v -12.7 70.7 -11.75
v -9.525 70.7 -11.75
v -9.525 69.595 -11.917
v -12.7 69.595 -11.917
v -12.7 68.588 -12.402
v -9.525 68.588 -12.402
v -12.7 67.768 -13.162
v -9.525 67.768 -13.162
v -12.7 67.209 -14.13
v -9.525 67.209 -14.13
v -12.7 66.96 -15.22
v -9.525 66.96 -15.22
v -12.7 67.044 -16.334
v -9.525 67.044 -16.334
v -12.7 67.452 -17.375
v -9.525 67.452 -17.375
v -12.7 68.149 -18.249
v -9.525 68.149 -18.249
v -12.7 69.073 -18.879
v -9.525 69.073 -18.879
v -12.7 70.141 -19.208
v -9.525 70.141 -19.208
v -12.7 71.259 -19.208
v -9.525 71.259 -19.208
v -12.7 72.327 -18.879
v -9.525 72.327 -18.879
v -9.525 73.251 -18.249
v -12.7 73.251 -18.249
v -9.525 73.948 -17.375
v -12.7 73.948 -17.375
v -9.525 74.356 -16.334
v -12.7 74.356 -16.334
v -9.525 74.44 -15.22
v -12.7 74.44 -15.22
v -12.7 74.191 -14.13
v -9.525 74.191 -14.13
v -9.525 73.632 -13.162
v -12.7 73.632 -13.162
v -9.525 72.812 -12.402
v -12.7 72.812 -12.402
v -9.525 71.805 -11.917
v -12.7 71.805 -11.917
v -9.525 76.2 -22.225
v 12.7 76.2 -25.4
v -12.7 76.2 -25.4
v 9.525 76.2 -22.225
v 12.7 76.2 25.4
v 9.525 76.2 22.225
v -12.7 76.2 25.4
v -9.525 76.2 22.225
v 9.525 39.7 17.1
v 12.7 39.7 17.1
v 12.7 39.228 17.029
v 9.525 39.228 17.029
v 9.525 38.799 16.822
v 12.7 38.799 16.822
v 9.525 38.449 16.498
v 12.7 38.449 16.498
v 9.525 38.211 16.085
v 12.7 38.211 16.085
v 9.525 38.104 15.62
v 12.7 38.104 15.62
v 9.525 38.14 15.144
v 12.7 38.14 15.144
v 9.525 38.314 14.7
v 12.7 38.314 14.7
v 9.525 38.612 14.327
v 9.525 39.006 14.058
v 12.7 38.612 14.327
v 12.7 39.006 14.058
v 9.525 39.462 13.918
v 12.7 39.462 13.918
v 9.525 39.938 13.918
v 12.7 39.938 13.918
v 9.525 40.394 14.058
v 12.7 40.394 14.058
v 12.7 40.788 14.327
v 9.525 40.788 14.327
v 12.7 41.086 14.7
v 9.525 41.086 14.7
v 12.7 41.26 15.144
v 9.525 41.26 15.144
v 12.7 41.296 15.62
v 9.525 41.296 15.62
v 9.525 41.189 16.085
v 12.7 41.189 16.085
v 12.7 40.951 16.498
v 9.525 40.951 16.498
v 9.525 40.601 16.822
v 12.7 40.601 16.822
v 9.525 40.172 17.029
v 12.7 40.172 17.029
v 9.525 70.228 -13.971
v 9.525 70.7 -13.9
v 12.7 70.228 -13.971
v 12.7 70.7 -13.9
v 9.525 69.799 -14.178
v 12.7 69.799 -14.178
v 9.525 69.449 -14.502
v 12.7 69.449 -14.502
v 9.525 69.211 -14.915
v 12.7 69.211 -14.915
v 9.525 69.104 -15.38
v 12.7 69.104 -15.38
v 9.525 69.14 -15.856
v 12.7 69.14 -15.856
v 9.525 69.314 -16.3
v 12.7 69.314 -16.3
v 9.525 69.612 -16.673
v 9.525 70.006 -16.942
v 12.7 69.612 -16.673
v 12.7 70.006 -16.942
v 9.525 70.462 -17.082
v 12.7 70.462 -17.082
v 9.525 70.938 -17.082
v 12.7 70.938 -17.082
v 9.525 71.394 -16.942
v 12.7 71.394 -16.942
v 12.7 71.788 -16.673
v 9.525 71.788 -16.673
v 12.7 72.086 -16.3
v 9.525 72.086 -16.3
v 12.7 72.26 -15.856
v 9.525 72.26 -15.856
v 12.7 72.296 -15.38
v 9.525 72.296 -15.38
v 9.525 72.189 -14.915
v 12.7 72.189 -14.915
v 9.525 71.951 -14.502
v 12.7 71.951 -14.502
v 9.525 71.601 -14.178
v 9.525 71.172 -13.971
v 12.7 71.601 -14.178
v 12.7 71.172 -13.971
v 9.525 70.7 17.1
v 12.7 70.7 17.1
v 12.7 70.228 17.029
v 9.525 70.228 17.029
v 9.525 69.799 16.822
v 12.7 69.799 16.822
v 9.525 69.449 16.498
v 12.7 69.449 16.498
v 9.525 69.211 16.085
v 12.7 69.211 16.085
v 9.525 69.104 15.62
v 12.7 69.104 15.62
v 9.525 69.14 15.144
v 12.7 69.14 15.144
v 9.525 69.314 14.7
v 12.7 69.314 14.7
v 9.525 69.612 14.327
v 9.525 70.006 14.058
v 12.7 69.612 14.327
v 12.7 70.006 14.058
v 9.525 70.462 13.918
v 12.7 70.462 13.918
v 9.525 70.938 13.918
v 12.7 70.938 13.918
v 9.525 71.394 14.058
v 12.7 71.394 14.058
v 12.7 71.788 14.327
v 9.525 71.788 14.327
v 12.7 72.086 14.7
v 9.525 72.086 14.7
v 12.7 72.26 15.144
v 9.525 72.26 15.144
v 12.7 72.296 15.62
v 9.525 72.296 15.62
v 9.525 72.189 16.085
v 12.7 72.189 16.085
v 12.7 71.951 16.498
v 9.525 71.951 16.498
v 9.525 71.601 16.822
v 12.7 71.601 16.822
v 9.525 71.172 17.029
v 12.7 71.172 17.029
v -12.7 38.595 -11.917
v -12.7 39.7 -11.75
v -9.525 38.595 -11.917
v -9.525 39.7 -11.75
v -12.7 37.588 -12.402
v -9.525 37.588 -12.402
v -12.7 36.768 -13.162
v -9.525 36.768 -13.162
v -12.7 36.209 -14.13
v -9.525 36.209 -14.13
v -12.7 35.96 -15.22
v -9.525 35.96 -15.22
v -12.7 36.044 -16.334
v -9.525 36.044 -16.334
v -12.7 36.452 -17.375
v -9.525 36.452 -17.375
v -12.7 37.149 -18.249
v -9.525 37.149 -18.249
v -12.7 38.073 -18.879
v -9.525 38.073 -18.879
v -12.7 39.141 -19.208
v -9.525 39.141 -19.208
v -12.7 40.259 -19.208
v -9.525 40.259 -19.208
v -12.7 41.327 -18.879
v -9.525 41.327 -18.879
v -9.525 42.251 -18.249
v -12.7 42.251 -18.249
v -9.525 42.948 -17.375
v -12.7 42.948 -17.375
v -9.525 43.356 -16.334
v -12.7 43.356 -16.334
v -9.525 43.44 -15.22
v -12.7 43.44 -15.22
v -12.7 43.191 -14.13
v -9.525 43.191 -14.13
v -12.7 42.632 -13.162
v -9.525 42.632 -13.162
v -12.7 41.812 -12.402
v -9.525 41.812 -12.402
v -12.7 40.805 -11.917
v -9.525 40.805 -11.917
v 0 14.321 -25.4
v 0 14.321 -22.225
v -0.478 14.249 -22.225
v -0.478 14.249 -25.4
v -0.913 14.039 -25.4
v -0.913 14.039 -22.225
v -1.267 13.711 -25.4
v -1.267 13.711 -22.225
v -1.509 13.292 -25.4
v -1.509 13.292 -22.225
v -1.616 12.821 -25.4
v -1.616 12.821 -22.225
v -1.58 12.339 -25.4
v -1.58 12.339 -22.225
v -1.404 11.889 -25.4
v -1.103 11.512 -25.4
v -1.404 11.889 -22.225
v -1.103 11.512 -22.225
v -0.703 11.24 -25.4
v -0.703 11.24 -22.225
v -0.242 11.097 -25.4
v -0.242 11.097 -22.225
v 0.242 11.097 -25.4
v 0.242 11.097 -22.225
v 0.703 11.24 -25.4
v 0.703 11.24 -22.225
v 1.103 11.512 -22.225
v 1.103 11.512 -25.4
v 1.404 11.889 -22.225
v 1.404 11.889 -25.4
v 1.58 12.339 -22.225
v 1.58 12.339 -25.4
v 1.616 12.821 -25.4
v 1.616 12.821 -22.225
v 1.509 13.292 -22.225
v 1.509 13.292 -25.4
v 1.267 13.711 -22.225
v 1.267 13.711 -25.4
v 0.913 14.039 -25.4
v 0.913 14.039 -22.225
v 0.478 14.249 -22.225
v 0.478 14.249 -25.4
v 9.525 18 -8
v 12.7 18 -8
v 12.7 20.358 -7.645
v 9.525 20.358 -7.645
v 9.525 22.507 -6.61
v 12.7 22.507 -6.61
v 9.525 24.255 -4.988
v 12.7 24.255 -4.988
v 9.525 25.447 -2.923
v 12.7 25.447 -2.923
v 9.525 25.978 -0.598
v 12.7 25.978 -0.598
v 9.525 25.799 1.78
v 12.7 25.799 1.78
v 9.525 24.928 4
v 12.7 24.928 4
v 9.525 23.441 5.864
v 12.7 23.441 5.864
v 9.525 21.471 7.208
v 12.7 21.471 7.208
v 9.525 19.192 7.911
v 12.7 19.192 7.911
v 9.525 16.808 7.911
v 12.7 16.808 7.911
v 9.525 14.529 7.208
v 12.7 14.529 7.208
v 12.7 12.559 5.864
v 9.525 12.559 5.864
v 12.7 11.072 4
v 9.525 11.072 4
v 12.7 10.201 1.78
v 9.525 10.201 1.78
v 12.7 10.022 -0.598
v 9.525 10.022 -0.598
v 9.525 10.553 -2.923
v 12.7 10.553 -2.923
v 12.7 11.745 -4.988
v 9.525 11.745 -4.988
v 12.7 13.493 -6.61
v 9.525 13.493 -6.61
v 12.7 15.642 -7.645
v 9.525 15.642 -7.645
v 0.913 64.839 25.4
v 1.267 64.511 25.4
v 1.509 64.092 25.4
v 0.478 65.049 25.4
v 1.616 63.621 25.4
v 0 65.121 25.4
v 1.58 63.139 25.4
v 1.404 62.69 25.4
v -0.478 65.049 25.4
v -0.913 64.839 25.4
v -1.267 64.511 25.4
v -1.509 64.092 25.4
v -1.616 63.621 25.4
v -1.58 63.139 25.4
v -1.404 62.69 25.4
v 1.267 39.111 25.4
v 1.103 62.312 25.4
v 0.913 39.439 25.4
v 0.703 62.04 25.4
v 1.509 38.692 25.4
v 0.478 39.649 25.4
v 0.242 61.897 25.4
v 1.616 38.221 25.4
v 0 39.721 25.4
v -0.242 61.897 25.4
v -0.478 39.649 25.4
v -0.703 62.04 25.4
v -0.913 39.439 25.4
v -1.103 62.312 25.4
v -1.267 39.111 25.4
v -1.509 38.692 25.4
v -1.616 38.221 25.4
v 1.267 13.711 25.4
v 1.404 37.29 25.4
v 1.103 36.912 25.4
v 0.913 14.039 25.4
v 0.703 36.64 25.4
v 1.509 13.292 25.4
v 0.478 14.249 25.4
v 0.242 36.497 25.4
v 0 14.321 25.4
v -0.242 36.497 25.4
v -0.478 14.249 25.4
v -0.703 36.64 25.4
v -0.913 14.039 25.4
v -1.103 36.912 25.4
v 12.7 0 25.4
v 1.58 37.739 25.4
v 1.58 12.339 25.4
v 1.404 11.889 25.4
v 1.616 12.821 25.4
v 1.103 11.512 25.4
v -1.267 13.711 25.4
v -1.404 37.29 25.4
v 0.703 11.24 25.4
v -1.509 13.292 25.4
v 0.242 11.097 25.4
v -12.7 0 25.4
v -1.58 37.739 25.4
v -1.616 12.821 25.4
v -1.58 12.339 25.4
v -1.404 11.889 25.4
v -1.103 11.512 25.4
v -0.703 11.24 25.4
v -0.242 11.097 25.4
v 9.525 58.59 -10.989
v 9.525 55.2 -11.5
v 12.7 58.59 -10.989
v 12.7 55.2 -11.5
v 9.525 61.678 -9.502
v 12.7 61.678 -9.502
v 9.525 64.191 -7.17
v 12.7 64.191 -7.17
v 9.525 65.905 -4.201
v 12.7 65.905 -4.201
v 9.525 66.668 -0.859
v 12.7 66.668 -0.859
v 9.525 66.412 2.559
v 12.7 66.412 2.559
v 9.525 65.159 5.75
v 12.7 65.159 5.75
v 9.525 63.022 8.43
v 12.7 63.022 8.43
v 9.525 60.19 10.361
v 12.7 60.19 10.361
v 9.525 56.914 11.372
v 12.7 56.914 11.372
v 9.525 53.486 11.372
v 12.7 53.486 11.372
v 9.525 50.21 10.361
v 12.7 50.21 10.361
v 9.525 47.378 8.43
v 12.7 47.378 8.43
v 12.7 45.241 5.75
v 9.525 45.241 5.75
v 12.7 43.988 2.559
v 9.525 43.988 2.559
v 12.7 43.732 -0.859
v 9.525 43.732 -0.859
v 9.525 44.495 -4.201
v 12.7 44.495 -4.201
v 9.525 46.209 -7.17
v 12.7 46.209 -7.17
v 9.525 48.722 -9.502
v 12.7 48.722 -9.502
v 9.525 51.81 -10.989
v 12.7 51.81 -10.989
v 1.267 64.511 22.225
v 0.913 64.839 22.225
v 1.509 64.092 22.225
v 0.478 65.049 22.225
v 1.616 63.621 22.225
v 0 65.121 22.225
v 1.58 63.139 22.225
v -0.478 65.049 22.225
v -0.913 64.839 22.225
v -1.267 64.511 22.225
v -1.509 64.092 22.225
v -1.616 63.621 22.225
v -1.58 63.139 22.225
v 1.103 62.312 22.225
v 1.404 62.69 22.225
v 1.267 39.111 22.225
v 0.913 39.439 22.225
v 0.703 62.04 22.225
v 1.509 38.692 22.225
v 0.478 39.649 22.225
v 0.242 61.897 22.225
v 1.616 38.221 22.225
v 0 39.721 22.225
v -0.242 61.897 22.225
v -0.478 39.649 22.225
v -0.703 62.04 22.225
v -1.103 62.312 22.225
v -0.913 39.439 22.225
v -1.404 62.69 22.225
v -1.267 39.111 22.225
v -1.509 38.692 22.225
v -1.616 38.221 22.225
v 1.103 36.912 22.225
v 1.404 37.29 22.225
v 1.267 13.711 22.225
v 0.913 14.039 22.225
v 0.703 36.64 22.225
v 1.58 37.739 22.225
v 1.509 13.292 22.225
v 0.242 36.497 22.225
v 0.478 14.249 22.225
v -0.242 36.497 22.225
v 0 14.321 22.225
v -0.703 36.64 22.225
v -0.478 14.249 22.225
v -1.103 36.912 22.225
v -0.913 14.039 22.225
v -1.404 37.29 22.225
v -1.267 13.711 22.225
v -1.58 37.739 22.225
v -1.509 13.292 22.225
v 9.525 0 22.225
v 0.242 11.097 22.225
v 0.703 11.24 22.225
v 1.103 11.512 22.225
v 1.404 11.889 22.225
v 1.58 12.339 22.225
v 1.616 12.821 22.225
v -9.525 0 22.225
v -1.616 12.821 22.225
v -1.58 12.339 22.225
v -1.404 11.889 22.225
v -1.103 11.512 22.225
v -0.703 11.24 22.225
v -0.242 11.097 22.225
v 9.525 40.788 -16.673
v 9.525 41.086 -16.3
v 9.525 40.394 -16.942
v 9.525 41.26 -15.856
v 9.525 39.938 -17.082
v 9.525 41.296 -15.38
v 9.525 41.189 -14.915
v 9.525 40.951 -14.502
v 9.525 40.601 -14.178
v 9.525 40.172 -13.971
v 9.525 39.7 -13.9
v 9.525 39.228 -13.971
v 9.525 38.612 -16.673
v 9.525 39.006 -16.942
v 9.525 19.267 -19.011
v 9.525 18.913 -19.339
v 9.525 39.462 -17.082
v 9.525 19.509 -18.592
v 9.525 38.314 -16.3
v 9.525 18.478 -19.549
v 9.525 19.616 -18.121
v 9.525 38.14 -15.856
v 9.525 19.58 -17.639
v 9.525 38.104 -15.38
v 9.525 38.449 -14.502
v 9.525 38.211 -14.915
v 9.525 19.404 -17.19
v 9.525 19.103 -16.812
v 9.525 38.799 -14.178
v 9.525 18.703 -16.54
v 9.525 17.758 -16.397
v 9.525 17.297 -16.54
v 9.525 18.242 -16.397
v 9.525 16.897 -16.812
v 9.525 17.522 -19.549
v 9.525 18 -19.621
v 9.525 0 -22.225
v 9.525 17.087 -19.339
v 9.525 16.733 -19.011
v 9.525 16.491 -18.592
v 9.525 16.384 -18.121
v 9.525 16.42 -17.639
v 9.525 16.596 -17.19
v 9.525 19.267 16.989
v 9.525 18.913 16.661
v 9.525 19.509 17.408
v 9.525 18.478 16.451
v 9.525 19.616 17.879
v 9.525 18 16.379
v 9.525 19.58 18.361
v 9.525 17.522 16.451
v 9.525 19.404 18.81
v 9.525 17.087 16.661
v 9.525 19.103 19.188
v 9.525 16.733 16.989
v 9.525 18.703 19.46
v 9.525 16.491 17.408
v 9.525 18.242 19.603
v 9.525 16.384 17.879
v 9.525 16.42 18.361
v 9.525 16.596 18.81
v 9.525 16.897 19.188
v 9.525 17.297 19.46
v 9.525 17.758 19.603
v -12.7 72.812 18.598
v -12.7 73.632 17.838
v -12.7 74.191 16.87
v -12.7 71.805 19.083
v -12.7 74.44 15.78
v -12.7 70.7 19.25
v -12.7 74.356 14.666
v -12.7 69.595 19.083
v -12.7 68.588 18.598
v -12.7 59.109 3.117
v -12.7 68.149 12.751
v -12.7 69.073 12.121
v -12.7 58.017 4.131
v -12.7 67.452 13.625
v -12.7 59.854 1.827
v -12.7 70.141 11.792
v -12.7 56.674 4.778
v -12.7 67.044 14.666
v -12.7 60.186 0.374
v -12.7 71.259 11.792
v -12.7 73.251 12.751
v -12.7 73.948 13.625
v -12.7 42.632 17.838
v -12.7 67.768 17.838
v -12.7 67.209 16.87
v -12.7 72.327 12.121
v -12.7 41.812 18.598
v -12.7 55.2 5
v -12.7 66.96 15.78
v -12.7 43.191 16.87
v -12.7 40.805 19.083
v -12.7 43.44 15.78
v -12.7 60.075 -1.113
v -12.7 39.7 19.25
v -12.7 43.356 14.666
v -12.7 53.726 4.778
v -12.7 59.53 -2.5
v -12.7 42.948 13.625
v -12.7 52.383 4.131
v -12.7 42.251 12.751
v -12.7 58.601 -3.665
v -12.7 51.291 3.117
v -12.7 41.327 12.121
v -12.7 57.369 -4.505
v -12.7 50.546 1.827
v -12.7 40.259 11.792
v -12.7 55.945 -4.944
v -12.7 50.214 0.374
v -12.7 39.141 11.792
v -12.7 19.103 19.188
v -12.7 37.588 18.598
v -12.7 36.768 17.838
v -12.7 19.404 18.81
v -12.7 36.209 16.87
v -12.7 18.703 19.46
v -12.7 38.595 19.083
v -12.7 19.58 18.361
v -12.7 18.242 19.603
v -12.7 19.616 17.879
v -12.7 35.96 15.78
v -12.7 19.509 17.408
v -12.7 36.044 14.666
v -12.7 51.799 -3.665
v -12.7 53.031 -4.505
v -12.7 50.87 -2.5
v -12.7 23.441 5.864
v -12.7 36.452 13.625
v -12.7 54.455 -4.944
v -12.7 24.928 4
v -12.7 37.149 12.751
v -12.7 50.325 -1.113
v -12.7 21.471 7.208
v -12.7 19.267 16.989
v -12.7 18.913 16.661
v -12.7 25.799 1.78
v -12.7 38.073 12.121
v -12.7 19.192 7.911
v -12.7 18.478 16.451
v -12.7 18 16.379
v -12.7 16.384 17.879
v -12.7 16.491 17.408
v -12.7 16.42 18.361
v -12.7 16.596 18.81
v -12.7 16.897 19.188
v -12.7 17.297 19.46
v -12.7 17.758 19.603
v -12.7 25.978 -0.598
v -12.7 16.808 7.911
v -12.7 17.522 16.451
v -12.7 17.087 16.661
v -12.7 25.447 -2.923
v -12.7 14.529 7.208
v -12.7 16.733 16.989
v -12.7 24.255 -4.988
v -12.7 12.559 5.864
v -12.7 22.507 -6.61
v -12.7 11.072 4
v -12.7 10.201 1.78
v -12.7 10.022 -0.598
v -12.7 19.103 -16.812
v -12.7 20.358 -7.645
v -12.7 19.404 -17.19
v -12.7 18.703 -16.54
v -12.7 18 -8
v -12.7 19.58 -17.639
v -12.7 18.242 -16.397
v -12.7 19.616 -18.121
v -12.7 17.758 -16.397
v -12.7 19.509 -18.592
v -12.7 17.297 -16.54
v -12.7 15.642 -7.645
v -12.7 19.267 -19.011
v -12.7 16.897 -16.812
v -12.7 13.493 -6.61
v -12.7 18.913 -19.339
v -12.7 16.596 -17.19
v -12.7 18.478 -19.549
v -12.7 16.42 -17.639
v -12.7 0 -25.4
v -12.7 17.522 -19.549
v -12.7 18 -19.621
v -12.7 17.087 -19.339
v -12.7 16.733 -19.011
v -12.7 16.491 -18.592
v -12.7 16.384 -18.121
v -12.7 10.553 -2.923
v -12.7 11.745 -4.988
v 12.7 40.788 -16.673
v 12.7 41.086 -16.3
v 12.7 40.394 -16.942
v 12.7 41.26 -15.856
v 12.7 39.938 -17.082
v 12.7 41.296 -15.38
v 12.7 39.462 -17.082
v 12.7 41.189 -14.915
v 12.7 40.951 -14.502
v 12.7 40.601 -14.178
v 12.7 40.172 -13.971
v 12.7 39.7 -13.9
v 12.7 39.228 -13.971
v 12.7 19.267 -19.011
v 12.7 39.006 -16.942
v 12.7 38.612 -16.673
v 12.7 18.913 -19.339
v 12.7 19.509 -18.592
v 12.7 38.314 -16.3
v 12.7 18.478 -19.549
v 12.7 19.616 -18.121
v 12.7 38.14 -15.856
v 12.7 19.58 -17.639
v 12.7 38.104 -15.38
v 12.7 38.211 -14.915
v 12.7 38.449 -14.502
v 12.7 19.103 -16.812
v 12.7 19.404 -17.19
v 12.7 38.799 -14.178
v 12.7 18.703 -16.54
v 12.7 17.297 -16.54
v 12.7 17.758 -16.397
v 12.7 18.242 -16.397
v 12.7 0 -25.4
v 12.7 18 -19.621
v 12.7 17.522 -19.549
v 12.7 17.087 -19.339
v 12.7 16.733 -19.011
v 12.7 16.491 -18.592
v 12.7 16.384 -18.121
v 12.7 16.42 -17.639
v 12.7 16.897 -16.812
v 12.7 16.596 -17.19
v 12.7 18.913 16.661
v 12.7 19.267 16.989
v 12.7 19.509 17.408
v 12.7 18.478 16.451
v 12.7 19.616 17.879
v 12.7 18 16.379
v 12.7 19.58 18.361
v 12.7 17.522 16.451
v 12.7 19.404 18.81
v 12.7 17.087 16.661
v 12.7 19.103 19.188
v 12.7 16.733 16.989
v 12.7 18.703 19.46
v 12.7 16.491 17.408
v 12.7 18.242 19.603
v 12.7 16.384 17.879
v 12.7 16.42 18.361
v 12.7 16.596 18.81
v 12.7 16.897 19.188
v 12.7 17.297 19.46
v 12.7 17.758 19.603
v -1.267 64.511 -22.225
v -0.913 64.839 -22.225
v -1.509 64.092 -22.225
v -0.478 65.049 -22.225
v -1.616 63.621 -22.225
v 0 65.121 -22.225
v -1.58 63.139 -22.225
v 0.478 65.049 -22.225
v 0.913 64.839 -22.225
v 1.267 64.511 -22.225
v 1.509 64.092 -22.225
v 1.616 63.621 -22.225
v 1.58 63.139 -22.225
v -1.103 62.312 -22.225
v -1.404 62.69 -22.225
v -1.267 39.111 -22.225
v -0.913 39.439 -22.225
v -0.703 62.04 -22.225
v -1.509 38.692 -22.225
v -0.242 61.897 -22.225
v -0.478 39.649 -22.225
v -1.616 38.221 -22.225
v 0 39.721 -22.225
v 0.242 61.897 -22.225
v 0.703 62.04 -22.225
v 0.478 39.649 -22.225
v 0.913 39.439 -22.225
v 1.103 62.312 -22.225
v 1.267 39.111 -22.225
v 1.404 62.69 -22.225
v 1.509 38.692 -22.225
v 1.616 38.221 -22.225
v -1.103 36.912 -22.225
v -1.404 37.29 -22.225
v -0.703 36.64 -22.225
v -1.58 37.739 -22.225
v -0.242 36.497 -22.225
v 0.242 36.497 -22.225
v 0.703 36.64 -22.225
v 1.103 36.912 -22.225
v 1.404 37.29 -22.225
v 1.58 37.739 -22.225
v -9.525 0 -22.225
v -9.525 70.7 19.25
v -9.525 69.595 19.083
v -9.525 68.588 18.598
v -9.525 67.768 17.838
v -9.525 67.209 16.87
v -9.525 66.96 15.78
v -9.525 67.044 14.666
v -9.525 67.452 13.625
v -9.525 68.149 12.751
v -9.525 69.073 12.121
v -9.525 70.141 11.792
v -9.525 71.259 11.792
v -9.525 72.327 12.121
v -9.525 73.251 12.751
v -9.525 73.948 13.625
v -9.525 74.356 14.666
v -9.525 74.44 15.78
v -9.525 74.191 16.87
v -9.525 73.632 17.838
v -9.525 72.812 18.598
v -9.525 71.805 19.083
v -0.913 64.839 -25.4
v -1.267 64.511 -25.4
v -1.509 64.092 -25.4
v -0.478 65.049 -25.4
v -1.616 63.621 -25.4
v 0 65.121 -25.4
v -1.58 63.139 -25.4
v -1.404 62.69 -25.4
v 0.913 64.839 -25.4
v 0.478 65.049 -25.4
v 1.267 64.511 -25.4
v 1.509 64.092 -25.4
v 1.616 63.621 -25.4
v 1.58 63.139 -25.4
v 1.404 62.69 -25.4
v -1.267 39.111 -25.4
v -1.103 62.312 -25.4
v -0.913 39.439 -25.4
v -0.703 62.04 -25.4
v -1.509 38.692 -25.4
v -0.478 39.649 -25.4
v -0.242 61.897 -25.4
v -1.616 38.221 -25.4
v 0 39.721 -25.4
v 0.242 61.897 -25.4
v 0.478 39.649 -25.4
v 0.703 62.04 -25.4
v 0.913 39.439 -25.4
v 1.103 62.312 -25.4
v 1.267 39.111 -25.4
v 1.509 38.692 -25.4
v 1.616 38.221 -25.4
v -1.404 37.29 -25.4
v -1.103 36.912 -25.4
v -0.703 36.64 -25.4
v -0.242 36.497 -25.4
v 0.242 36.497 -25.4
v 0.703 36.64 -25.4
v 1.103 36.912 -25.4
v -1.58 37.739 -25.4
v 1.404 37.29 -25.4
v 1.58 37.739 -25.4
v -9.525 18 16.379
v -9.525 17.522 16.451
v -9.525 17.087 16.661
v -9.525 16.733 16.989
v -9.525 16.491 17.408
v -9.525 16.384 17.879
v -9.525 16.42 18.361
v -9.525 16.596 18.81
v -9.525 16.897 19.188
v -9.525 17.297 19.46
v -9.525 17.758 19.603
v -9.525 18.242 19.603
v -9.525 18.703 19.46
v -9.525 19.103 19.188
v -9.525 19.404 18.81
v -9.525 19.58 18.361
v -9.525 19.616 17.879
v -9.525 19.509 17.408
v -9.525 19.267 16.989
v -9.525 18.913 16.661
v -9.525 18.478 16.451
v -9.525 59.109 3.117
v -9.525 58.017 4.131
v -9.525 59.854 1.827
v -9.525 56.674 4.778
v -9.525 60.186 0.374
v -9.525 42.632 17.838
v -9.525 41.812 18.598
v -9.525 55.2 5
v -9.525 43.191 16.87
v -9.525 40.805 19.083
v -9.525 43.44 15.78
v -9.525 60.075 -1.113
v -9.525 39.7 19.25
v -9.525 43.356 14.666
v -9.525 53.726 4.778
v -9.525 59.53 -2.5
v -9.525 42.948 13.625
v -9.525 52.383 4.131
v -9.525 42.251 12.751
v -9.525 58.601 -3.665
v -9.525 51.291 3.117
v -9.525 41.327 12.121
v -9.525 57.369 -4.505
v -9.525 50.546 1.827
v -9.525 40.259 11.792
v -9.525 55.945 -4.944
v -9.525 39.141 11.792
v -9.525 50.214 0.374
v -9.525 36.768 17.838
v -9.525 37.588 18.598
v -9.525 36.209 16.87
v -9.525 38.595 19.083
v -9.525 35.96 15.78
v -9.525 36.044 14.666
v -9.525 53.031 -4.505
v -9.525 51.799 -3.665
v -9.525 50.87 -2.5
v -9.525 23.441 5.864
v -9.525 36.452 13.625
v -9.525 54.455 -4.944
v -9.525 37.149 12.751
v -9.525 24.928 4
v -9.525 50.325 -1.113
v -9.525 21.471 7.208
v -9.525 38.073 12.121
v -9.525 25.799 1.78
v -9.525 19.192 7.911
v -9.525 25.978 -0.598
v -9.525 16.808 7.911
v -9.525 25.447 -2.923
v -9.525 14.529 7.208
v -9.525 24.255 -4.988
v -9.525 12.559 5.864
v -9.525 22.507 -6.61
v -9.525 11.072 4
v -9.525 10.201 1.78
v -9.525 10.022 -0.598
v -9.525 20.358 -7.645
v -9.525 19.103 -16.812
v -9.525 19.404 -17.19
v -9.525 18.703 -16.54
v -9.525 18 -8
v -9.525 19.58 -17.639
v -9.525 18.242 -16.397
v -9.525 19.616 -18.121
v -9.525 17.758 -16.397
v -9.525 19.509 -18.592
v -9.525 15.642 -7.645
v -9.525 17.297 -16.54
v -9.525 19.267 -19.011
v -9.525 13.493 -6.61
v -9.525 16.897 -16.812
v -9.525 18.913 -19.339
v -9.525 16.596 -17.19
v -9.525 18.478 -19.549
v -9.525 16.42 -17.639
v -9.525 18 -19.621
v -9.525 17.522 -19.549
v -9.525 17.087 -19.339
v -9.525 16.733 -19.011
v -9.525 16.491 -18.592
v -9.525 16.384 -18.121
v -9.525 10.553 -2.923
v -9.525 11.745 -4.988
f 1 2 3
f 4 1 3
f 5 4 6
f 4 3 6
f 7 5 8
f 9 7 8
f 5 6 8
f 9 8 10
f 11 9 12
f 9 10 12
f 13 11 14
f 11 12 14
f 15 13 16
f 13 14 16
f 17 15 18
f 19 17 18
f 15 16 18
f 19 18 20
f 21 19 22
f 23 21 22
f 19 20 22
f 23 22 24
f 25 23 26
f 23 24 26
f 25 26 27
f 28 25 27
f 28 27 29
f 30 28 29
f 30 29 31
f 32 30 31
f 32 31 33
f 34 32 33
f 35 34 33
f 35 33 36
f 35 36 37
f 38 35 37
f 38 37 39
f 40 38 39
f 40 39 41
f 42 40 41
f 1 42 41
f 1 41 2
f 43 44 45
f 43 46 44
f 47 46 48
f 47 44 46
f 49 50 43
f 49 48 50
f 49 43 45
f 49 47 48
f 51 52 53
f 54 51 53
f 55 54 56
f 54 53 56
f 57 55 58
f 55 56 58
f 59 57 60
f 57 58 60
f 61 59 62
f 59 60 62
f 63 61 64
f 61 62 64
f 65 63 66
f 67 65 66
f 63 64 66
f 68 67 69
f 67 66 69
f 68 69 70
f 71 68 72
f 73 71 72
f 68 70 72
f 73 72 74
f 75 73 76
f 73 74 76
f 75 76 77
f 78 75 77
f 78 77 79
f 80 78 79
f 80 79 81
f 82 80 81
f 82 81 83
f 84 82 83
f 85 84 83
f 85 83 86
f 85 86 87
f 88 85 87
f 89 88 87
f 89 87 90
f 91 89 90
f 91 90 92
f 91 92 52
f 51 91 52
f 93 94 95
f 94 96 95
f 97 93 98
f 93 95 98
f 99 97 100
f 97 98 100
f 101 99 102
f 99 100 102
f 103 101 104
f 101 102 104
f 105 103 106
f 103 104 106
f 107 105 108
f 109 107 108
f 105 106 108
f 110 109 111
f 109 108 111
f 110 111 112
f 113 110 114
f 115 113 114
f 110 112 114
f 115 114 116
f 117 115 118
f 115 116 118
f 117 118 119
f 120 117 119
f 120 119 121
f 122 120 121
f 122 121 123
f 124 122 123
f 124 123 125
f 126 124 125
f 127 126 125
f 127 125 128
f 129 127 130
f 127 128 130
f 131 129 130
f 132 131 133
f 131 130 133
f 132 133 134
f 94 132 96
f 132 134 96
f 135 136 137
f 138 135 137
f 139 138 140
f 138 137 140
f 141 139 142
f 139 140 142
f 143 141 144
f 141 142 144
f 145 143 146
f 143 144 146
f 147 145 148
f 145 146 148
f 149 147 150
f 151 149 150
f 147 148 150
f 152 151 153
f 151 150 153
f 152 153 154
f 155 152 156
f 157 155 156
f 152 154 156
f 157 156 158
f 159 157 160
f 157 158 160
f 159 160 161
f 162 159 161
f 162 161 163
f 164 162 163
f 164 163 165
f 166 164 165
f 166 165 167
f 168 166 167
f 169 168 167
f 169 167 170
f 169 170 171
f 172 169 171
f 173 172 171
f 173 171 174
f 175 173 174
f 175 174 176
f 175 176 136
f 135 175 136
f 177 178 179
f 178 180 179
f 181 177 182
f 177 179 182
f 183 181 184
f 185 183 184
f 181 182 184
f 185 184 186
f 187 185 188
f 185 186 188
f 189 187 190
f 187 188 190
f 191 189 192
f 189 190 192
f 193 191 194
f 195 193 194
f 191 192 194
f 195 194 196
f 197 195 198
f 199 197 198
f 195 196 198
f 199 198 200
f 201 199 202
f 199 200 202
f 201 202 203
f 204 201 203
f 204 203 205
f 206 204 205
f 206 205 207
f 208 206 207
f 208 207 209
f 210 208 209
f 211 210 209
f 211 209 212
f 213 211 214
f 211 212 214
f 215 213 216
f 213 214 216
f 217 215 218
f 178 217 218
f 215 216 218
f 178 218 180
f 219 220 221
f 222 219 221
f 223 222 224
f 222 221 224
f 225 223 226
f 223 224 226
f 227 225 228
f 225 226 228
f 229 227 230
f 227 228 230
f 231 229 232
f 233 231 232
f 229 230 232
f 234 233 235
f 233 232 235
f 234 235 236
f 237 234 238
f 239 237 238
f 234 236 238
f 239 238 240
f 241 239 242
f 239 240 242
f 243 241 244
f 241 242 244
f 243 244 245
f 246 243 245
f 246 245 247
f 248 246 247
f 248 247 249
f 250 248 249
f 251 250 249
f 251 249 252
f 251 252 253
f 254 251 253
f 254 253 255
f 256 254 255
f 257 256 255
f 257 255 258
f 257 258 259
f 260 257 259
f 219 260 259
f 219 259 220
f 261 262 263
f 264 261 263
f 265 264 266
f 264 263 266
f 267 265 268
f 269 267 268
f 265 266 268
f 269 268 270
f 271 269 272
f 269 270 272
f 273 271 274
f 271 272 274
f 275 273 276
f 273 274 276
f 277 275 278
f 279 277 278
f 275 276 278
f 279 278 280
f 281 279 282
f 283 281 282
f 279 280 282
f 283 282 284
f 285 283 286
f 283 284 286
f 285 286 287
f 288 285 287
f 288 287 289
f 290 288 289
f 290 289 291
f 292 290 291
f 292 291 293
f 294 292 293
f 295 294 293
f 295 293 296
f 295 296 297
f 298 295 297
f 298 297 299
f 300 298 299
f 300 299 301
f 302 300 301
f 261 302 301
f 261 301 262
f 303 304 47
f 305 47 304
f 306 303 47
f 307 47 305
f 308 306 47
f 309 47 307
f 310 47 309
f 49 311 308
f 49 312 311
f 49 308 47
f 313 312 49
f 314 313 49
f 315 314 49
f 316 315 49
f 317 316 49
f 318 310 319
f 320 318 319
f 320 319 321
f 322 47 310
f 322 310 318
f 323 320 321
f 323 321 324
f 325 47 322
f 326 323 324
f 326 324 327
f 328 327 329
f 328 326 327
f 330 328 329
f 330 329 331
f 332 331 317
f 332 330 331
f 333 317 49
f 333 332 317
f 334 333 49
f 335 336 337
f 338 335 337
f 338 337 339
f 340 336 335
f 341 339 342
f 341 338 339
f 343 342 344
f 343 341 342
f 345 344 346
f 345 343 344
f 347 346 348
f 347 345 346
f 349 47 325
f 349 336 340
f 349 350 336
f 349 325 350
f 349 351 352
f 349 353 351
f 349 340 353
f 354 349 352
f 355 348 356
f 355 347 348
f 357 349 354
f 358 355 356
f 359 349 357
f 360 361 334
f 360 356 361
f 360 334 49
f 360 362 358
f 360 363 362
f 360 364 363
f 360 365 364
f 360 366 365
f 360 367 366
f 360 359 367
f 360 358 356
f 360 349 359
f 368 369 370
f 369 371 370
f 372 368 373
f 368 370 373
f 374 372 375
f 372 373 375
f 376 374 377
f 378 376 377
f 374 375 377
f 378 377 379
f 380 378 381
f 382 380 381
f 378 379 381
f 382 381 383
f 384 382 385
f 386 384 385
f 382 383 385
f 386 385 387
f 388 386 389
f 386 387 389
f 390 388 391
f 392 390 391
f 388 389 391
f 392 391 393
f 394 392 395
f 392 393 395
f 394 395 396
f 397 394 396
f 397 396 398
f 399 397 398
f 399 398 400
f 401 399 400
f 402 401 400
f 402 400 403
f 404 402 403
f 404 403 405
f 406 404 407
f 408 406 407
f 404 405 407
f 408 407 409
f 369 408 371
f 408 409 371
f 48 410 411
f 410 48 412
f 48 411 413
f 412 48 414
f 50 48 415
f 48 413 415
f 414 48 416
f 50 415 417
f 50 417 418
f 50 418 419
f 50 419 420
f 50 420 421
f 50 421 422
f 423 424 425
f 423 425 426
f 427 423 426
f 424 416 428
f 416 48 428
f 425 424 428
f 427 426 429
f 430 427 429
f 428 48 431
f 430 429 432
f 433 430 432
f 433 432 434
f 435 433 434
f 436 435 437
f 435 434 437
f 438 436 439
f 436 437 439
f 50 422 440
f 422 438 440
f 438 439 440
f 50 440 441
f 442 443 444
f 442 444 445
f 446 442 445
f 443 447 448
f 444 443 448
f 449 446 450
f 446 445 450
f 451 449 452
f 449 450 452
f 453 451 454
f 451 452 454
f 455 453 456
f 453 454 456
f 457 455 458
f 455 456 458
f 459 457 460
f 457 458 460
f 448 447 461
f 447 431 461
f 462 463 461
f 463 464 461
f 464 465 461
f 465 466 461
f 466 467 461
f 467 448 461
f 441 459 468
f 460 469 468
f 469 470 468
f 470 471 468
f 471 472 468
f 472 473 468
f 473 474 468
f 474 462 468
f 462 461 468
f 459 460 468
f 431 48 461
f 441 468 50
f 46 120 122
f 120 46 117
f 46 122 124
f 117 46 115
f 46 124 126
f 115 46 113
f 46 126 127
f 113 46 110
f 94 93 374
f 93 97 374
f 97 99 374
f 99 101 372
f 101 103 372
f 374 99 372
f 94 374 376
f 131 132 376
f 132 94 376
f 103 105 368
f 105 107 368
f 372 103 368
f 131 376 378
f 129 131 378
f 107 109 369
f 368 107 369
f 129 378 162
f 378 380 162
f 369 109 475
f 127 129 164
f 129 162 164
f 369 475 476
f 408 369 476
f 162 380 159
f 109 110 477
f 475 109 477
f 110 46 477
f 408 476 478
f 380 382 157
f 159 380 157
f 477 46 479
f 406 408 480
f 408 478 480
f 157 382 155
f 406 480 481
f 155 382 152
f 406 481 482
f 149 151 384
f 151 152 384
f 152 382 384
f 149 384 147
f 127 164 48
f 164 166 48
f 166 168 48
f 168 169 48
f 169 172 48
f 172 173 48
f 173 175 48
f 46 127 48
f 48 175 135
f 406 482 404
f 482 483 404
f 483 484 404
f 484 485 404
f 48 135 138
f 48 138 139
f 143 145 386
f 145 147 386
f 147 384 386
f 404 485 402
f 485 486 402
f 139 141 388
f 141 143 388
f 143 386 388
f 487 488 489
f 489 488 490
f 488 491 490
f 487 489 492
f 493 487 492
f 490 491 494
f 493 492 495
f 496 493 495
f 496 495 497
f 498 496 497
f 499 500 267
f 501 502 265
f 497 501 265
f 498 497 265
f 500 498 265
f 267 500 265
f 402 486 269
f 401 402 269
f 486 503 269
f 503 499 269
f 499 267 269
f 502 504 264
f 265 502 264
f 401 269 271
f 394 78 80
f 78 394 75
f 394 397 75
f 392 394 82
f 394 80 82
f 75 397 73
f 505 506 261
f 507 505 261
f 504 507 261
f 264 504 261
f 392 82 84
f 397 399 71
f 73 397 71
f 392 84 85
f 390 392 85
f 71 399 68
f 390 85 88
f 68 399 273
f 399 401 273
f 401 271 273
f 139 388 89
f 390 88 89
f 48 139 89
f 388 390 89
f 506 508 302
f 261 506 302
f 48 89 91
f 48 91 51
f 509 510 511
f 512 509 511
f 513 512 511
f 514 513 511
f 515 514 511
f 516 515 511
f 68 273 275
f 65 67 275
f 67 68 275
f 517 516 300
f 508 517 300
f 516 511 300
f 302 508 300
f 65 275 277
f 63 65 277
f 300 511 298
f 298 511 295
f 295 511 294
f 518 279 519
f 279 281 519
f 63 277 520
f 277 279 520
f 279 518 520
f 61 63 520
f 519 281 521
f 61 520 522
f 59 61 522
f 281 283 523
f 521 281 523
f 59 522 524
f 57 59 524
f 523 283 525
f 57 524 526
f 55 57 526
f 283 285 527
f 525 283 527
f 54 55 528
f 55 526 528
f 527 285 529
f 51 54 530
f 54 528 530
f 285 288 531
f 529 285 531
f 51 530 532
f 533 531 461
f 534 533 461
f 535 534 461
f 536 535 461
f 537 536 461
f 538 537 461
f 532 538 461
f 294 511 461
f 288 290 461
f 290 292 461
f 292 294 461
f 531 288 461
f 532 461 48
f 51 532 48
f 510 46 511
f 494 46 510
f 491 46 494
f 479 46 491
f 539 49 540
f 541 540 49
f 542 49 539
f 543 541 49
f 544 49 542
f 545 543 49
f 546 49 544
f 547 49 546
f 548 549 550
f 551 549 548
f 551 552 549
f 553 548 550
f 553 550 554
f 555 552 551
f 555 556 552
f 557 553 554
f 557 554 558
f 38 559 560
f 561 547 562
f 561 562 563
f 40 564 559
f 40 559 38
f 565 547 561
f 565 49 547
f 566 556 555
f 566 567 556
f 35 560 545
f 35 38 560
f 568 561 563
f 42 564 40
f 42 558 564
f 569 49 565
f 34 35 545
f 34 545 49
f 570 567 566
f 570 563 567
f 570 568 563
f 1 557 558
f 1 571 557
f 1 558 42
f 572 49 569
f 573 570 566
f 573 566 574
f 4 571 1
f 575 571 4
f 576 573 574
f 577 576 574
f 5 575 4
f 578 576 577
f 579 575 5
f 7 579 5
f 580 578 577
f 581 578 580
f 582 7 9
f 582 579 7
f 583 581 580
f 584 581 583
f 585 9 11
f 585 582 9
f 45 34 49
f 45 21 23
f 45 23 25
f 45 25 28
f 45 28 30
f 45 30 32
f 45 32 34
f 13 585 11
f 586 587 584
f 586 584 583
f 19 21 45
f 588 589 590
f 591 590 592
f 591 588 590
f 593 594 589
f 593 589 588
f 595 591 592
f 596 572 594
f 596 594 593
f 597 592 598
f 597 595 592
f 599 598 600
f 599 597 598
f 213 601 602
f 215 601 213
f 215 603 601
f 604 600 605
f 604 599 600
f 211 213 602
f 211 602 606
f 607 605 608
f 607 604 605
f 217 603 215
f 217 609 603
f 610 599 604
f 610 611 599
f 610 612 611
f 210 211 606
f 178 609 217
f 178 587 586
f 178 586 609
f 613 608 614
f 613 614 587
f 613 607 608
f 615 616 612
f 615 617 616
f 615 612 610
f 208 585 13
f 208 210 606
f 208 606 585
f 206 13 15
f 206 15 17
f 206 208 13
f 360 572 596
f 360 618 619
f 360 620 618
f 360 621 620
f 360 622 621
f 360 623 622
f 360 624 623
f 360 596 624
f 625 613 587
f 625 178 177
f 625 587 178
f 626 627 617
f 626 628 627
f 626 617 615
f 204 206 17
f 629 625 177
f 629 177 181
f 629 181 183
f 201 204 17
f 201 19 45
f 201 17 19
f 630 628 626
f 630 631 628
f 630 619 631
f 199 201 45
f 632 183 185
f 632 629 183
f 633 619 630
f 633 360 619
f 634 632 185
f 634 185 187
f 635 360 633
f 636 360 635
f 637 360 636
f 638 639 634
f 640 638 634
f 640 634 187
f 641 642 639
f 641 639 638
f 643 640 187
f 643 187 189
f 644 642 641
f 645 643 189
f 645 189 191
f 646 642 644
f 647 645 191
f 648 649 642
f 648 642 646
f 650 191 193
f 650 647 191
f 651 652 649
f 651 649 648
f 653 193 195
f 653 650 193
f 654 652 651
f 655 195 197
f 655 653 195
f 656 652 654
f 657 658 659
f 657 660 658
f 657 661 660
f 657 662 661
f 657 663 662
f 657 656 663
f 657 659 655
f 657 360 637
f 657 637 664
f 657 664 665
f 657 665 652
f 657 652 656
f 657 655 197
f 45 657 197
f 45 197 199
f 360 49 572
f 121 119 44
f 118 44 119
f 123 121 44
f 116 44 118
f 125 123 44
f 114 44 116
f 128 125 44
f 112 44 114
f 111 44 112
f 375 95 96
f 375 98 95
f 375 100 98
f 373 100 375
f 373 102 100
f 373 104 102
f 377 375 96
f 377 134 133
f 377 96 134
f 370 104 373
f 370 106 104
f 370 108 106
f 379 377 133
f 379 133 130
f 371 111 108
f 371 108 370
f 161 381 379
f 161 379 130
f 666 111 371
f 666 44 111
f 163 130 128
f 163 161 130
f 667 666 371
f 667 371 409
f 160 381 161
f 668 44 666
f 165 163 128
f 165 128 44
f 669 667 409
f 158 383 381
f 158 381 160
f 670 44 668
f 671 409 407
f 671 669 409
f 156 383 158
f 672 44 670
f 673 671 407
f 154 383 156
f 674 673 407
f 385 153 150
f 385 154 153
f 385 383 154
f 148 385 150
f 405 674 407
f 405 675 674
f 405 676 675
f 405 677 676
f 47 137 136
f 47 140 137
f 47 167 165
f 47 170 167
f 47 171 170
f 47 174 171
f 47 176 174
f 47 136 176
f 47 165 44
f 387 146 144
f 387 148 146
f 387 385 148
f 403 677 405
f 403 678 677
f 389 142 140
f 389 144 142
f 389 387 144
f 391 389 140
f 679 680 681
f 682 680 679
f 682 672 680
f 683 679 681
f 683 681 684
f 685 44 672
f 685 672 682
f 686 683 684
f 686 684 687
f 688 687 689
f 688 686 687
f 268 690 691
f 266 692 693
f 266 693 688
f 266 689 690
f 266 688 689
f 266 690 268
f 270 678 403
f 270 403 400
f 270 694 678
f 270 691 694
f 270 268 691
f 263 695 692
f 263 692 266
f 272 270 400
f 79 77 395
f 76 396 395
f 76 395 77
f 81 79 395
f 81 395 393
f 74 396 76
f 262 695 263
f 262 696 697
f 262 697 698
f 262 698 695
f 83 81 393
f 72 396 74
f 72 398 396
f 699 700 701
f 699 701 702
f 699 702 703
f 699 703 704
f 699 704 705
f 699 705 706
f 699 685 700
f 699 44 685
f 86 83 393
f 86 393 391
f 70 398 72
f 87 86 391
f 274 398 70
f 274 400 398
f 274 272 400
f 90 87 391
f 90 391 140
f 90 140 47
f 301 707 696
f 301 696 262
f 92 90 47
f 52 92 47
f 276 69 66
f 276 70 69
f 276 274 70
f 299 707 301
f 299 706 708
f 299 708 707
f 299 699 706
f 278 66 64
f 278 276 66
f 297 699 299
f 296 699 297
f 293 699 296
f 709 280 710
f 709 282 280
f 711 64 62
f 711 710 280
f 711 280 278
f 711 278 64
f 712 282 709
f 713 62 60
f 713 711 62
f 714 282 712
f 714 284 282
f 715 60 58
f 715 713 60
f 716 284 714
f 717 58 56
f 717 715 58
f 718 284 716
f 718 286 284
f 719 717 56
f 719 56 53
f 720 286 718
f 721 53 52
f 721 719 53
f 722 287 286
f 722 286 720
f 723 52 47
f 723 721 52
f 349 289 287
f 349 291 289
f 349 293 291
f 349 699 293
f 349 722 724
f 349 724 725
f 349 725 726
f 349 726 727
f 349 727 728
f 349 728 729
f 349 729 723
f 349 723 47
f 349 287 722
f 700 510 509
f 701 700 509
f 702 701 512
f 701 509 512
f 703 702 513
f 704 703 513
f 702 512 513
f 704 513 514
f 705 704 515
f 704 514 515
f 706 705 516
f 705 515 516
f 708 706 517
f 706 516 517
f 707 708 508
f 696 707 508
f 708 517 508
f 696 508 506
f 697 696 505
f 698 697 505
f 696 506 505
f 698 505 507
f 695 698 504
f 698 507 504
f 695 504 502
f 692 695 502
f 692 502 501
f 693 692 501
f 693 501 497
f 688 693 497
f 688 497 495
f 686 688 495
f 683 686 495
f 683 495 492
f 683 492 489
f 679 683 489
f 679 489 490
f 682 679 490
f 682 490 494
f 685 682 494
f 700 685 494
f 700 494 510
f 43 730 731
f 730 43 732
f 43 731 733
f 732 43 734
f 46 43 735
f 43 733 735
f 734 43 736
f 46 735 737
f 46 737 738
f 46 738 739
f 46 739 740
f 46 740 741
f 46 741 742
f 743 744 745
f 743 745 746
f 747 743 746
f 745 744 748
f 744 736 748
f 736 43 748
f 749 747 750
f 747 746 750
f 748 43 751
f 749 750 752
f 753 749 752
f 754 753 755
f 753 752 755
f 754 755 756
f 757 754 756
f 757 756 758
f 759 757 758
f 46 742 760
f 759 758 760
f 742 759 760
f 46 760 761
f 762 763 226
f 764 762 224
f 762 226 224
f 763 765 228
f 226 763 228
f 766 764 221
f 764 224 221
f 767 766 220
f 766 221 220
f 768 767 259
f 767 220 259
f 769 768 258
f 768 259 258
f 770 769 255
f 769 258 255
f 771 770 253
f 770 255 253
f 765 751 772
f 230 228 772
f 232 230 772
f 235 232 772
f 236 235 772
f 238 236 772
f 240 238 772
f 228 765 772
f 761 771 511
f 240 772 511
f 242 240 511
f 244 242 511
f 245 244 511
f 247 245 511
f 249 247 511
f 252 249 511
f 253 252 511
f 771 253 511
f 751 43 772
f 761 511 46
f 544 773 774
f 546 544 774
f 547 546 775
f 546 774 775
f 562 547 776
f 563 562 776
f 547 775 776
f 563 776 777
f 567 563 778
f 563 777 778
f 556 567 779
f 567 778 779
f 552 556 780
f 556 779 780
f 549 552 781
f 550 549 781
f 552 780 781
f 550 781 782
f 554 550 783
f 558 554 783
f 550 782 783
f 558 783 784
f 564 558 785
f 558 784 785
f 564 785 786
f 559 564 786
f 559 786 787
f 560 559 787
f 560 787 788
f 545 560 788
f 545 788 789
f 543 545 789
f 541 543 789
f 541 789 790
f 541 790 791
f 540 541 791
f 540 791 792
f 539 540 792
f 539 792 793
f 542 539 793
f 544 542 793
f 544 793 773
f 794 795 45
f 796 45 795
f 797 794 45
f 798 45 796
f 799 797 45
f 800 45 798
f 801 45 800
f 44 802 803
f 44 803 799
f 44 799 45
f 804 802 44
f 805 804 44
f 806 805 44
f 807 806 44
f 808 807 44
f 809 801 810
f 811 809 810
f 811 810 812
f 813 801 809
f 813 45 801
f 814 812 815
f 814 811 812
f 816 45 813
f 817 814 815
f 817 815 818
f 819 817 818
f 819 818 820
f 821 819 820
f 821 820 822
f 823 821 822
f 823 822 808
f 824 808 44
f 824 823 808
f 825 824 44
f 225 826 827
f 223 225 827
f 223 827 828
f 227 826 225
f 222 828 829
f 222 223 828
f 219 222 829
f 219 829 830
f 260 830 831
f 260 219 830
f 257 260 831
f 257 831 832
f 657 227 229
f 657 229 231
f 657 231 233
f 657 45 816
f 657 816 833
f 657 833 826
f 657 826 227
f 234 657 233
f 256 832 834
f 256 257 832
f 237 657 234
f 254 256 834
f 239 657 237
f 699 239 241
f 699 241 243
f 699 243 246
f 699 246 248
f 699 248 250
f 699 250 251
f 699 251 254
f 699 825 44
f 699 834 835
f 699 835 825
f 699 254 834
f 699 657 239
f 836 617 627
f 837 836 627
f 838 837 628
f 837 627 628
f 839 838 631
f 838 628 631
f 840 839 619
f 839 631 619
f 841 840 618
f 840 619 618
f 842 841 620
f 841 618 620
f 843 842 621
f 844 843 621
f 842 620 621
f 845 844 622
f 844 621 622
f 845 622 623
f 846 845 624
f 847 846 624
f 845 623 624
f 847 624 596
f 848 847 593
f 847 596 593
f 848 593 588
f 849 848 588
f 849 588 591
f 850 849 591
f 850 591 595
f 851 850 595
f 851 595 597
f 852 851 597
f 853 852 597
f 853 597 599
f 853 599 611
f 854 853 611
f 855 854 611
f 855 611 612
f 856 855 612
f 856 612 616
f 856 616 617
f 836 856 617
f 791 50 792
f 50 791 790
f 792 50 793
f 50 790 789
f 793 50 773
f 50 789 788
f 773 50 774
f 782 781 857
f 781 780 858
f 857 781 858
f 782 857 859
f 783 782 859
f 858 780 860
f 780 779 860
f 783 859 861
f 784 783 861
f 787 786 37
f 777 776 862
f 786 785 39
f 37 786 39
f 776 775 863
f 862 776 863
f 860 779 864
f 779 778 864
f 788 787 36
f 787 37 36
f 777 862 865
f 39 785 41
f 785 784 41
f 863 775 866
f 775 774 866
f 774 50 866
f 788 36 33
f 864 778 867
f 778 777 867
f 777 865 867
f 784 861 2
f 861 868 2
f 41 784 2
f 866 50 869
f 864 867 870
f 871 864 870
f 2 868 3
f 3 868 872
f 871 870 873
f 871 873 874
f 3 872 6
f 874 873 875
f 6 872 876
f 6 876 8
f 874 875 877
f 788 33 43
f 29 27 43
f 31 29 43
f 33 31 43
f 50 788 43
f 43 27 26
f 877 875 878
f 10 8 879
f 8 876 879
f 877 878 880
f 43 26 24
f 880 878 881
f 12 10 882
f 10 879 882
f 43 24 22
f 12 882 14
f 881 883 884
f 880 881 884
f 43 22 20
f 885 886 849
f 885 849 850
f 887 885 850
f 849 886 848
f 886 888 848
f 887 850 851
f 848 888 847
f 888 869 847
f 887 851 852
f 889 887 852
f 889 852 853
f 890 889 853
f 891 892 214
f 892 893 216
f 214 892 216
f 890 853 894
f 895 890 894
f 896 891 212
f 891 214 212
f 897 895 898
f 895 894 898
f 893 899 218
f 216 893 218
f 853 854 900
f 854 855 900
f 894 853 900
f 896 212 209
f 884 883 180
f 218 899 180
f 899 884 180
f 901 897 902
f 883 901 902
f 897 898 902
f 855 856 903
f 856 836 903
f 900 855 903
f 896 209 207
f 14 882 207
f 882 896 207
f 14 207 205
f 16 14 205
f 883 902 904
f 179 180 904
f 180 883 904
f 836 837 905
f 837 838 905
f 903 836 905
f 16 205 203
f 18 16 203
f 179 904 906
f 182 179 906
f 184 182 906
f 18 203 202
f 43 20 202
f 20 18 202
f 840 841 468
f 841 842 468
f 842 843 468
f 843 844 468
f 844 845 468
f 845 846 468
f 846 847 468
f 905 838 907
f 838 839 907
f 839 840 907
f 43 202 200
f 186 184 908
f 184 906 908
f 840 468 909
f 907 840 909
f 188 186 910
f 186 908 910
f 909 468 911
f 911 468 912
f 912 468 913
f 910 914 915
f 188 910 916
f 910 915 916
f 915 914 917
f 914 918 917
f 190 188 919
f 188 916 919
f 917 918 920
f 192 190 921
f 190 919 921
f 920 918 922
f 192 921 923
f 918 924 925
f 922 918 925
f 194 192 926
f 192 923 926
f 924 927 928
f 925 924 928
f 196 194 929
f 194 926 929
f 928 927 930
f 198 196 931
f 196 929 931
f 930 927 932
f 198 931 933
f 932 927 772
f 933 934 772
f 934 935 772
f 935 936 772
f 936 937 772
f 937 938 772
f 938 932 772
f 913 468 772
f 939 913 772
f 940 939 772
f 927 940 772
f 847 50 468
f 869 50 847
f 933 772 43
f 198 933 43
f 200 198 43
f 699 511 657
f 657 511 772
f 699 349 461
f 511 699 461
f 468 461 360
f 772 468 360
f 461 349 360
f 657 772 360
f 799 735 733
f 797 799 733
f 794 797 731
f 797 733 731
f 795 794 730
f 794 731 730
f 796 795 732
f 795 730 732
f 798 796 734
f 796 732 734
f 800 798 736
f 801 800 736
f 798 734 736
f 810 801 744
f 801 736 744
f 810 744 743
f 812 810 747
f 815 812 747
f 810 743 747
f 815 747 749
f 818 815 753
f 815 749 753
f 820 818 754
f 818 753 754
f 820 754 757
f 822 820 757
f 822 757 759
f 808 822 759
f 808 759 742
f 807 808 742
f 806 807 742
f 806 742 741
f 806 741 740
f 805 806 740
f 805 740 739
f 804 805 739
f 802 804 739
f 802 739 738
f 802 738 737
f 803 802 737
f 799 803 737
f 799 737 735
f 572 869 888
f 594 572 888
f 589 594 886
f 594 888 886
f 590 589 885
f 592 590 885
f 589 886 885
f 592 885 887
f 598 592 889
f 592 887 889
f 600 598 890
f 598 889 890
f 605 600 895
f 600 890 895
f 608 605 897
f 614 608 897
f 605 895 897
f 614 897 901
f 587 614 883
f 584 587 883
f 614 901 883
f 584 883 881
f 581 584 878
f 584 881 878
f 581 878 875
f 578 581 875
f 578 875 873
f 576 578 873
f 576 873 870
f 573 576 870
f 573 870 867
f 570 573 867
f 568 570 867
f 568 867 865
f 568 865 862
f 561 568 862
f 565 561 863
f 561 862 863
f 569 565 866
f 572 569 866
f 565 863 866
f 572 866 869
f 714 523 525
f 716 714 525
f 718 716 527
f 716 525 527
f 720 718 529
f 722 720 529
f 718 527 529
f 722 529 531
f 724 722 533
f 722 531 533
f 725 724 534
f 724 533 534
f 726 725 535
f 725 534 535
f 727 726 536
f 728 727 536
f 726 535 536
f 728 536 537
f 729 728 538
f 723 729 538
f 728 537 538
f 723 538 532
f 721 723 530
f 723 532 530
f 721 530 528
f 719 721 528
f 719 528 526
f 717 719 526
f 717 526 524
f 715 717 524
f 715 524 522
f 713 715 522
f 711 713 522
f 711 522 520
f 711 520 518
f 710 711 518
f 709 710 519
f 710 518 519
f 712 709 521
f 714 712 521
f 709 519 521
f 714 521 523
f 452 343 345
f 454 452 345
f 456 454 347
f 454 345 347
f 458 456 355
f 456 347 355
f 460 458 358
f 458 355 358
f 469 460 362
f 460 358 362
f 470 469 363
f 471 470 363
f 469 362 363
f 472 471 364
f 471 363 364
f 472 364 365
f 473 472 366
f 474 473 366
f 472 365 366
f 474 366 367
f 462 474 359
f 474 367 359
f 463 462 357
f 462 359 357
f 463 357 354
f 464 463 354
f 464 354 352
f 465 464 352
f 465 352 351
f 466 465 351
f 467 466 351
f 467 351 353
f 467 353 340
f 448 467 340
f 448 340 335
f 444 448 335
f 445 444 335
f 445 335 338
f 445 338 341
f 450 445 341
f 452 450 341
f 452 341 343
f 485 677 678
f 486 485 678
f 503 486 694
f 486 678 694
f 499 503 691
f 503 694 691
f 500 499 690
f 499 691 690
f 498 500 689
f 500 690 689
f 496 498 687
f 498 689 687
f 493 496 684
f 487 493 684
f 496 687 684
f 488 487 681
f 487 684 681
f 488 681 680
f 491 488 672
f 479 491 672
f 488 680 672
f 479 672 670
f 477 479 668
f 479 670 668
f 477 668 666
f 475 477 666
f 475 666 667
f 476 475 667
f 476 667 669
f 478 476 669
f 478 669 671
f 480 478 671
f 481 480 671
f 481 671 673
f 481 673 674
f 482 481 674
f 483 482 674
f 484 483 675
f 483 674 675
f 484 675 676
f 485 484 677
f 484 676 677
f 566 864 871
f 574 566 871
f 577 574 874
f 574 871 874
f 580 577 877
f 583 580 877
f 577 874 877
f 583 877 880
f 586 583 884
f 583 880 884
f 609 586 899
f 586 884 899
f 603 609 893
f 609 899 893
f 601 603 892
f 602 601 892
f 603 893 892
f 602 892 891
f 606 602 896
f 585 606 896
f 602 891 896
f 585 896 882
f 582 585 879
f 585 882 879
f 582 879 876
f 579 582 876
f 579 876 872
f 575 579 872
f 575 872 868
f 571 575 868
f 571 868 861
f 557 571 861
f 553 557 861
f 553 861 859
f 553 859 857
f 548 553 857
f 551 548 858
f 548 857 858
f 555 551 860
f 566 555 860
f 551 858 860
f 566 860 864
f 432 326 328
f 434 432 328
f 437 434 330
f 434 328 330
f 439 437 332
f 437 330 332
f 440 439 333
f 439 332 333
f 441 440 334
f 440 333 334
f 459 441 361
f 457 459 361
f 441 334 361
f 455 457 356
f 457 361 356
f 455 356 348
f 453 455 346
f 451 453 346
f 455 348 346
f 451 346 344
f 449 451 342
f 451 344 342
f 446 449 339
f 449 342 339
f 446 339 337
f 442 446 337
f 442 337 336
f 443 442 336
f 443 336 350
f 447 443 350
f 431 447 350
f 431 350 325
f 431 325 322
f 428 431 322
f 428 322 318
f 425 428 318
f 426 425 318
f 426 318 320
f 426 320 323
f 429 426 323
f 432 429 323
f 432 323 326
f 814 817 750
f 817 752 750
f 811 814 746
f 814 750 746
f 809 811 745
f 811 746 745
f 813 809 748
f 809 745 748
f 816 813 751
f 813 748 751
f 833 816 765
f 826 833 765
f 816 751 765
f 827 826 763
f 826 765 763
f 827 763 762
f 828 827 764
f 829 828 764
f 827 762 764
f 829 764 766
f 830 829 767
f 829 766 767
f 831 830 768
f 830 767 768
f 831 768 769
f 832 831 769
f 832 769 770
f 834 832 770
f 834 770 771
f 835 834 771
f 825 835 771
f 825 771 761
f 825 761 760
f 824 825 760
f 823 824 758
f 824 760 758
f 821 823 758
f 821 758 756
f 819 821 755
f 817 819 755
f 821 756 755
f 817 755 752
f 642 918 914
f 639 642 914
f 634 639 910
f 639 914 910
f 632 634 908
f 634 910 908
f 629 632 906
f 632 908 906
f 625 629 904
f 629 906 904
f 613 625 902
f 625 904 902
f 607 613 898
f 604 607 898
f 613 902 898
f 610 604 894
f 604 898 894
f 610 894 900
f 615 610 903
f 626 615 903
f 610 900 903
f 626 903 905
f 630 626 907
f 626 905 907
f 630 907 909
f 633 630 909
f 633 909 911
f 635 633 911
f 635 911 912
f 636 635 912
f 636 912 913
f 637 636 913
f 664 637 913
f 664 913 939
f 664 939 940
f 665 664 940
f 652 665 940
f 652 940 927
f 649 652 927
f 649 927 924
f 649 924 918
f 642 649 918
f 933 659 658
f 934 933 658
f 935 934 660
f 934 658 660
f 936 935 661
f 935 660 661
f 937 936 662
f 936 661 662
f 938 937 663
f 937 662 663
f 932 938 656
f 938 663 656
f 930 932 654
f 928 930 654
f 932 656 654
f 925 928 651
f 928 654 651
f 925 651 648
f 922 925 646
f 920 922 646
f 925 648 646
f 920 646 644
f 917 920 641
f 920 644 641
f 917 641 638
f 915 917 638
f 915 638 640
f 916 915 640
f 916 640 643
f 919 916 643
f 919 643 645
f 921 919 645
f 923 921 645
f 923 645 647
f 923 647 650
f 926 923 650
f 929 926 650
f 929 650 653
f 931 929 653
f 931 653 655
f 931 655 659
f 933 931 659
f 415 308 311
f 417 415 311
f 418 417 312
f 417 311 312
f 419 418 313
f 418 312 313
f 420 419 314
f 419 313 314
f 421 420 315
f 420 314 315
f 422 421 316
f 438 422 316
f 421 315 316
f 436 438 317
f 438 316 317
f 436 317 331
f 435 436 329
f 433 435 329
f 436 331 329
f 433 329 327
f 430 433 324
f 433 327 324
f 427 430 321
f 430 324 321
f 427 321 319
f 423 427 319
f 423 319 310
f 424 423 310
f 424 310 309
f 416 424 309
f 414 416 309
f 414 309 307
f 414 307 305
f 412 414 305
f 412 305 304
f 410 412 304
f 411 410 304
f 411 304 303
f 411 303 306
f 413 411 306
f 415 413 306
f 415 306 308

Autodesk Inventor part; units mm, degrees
ref_plane "YZ Plane" through (0, 0, 0) normal (1, 0, 0) x (0, 1, 0)
ref_plane "XZ Plane" through (0, 0, 0) normal (0, 1, 0) x (-1, 0, 0)
ref_plane "XY Plane" through (0, 0, 0) normal (0, 0, 1) x (1, 0, 0)
sketch "Sketch1" plane through (0, 0, 0) normal (0, 1, 0) x (-1, 0, 0)
  line L0 (-12.7, 25.4) -> (12.7, 25.4)
  line L1 (12.7, 25.4) -> (12.7, -25.4)
  line L2 (12.7, -25.4) -> (-12.7, -25.4)
  line L3 (-12.7, -25.4) -> (-12.7, 25.4)
  line L4 (-12.7, 25.4) -> (12.7, -25.4) construction
  line L5 (12.7, 25.4) -> (-12.7, -25.4) construction
  point P0 (0, 0)
  dimension "d0" = 50.8
  dimension "d1" = 25.4
extrude "Extrusion1" add sketch "Sketch1" along normal blind 76.2
shell "Shell1" thickness 3.175 removed faces 2 at (-4.2333, 0, 8.4667) at (-4.2333, 76.2, 8.4667)
sketch "Sketch2" plane through (-12.7, 0, -25.4) normal (-1, 0, 0) x (0, 0, 1)
  line L0 (9.9, 39.7) -> (40.9, 39.7)
  line L1 (40.9, 39.7) -> (40.9, 70.7)
  line L2 (40.9, 70.7) -> (9.9, 70.7)
  line L3 (9.9, 70.7) -> (9.9, 39.7)
  line L4 (9.9, 39.7) -> (40.9, 70.7) construction
  line L5 (40.9, 39.7) -> (9.9, 70.7) construction
  line L6 (0, 76.2) -> (50.8, 76.2) projected
  point P0 (25.4, 0)
  point P1 (25.4, 55.2)
  point P2 (25.4, 55.2)
  point P3 (25.4, 76.2)
  dimension "d5" = 31
  dimension "d6" = 31
  dimension "d7" = 21
hole "Hole1" at (-12.7, 70.7, -15.5) at (-12.7, 70.7, 15.5) at (-12.7, 39.7, 15.5) at (-12.7, 39.7, -15.5) direction (1, 0, 0) diameter 3.2 end through all counterbore diameter 7.5 counterbore depth 5 clearance for "Socket Head Cap Screw" size "M3" standard "Ansi Metric M Profile"
hole "Hole2" at (-12.7, 55.2, 0) direction (1, 0, 0) diameter 10 end through all
sketch "Sketch3" plane through (12.7, 0, 25.4) normal (1, 0, 0) x (0, 0, -1)
  circle A0 centre (25.4, 55.2) radius 5 projected
  circle A1 centre (25.4, 55.2) radius 11.5
  point P0 (25.4, 0)
  dimension "d22" = 23
extrude "Extrusion2" cut sketch "Sketch3" against normal up to surface (22.225 mm away) contours A0 | A1
sketch "Sketch4" plane through (12.7, 0, 25.4) normal (1, 0, 0) x (0, 0, -1)
  circle A0 centre (25.4, 18) radius 8
  line L0 (50.8, 0) -> (0, 0) projected
  point P0 (25.4, 0)
  point P1 (25.4, 0)
  dimension "d25" = 16
  dimension "d26" = 18
extrude "Extrusion3" cut sketch "Sketch4" against normal through all
sketch "Sketch6" plane through (12.7, 0, -25.4) normal (0, 0, -1) x (-1, 0, 0)
  line L0 (12.7, 12.7) -> (12.7, 63.5)
  line L1 (25.4, 0) -> (0, 0) projected
  line L2 (0, 76.2) -> (25.4, 76.2) projected
  line L3 (25.4, 0) -> (25.4, 76.2) projected
  point P0 (12.7, 0)
  point P1 (12.7, 38.1)
  point P2 (12.7, 0)
  point P3 (25.4, 38.1)
  dimension "d55" = 50.8
hole "Hole4" at (0, 38.1, -25.4) at (0, 63.5, -25.4) at (0, 12.7, -25.4) direction (0, 0, 1) diameter 3.242 end through all thread size "M4x0.7" class "6H" standard "ANSI Metric M Profile"
sketch "Sketch7" plane through (12.7, 0, 25.4) normal (1, 0, 0) x (0, 0, -1)
  circle A0 centre (25.4, 18) radius 8 projected
  line L0 (7.4, 18) -> (43.4, 18)
  point P0 (25.4, 0)
  dimension "d47" = 36
hole "Hole5" at (12.7, 18, -18) at (12.7, 18, 18) direction (-1, 0, 0) diameter 3.242 end through all thread size "M4x0.7" class "6H" standard "ANSI Metric M Profile"
equation "\"d6\" = d5"
properties part number "Transmission_Case"
